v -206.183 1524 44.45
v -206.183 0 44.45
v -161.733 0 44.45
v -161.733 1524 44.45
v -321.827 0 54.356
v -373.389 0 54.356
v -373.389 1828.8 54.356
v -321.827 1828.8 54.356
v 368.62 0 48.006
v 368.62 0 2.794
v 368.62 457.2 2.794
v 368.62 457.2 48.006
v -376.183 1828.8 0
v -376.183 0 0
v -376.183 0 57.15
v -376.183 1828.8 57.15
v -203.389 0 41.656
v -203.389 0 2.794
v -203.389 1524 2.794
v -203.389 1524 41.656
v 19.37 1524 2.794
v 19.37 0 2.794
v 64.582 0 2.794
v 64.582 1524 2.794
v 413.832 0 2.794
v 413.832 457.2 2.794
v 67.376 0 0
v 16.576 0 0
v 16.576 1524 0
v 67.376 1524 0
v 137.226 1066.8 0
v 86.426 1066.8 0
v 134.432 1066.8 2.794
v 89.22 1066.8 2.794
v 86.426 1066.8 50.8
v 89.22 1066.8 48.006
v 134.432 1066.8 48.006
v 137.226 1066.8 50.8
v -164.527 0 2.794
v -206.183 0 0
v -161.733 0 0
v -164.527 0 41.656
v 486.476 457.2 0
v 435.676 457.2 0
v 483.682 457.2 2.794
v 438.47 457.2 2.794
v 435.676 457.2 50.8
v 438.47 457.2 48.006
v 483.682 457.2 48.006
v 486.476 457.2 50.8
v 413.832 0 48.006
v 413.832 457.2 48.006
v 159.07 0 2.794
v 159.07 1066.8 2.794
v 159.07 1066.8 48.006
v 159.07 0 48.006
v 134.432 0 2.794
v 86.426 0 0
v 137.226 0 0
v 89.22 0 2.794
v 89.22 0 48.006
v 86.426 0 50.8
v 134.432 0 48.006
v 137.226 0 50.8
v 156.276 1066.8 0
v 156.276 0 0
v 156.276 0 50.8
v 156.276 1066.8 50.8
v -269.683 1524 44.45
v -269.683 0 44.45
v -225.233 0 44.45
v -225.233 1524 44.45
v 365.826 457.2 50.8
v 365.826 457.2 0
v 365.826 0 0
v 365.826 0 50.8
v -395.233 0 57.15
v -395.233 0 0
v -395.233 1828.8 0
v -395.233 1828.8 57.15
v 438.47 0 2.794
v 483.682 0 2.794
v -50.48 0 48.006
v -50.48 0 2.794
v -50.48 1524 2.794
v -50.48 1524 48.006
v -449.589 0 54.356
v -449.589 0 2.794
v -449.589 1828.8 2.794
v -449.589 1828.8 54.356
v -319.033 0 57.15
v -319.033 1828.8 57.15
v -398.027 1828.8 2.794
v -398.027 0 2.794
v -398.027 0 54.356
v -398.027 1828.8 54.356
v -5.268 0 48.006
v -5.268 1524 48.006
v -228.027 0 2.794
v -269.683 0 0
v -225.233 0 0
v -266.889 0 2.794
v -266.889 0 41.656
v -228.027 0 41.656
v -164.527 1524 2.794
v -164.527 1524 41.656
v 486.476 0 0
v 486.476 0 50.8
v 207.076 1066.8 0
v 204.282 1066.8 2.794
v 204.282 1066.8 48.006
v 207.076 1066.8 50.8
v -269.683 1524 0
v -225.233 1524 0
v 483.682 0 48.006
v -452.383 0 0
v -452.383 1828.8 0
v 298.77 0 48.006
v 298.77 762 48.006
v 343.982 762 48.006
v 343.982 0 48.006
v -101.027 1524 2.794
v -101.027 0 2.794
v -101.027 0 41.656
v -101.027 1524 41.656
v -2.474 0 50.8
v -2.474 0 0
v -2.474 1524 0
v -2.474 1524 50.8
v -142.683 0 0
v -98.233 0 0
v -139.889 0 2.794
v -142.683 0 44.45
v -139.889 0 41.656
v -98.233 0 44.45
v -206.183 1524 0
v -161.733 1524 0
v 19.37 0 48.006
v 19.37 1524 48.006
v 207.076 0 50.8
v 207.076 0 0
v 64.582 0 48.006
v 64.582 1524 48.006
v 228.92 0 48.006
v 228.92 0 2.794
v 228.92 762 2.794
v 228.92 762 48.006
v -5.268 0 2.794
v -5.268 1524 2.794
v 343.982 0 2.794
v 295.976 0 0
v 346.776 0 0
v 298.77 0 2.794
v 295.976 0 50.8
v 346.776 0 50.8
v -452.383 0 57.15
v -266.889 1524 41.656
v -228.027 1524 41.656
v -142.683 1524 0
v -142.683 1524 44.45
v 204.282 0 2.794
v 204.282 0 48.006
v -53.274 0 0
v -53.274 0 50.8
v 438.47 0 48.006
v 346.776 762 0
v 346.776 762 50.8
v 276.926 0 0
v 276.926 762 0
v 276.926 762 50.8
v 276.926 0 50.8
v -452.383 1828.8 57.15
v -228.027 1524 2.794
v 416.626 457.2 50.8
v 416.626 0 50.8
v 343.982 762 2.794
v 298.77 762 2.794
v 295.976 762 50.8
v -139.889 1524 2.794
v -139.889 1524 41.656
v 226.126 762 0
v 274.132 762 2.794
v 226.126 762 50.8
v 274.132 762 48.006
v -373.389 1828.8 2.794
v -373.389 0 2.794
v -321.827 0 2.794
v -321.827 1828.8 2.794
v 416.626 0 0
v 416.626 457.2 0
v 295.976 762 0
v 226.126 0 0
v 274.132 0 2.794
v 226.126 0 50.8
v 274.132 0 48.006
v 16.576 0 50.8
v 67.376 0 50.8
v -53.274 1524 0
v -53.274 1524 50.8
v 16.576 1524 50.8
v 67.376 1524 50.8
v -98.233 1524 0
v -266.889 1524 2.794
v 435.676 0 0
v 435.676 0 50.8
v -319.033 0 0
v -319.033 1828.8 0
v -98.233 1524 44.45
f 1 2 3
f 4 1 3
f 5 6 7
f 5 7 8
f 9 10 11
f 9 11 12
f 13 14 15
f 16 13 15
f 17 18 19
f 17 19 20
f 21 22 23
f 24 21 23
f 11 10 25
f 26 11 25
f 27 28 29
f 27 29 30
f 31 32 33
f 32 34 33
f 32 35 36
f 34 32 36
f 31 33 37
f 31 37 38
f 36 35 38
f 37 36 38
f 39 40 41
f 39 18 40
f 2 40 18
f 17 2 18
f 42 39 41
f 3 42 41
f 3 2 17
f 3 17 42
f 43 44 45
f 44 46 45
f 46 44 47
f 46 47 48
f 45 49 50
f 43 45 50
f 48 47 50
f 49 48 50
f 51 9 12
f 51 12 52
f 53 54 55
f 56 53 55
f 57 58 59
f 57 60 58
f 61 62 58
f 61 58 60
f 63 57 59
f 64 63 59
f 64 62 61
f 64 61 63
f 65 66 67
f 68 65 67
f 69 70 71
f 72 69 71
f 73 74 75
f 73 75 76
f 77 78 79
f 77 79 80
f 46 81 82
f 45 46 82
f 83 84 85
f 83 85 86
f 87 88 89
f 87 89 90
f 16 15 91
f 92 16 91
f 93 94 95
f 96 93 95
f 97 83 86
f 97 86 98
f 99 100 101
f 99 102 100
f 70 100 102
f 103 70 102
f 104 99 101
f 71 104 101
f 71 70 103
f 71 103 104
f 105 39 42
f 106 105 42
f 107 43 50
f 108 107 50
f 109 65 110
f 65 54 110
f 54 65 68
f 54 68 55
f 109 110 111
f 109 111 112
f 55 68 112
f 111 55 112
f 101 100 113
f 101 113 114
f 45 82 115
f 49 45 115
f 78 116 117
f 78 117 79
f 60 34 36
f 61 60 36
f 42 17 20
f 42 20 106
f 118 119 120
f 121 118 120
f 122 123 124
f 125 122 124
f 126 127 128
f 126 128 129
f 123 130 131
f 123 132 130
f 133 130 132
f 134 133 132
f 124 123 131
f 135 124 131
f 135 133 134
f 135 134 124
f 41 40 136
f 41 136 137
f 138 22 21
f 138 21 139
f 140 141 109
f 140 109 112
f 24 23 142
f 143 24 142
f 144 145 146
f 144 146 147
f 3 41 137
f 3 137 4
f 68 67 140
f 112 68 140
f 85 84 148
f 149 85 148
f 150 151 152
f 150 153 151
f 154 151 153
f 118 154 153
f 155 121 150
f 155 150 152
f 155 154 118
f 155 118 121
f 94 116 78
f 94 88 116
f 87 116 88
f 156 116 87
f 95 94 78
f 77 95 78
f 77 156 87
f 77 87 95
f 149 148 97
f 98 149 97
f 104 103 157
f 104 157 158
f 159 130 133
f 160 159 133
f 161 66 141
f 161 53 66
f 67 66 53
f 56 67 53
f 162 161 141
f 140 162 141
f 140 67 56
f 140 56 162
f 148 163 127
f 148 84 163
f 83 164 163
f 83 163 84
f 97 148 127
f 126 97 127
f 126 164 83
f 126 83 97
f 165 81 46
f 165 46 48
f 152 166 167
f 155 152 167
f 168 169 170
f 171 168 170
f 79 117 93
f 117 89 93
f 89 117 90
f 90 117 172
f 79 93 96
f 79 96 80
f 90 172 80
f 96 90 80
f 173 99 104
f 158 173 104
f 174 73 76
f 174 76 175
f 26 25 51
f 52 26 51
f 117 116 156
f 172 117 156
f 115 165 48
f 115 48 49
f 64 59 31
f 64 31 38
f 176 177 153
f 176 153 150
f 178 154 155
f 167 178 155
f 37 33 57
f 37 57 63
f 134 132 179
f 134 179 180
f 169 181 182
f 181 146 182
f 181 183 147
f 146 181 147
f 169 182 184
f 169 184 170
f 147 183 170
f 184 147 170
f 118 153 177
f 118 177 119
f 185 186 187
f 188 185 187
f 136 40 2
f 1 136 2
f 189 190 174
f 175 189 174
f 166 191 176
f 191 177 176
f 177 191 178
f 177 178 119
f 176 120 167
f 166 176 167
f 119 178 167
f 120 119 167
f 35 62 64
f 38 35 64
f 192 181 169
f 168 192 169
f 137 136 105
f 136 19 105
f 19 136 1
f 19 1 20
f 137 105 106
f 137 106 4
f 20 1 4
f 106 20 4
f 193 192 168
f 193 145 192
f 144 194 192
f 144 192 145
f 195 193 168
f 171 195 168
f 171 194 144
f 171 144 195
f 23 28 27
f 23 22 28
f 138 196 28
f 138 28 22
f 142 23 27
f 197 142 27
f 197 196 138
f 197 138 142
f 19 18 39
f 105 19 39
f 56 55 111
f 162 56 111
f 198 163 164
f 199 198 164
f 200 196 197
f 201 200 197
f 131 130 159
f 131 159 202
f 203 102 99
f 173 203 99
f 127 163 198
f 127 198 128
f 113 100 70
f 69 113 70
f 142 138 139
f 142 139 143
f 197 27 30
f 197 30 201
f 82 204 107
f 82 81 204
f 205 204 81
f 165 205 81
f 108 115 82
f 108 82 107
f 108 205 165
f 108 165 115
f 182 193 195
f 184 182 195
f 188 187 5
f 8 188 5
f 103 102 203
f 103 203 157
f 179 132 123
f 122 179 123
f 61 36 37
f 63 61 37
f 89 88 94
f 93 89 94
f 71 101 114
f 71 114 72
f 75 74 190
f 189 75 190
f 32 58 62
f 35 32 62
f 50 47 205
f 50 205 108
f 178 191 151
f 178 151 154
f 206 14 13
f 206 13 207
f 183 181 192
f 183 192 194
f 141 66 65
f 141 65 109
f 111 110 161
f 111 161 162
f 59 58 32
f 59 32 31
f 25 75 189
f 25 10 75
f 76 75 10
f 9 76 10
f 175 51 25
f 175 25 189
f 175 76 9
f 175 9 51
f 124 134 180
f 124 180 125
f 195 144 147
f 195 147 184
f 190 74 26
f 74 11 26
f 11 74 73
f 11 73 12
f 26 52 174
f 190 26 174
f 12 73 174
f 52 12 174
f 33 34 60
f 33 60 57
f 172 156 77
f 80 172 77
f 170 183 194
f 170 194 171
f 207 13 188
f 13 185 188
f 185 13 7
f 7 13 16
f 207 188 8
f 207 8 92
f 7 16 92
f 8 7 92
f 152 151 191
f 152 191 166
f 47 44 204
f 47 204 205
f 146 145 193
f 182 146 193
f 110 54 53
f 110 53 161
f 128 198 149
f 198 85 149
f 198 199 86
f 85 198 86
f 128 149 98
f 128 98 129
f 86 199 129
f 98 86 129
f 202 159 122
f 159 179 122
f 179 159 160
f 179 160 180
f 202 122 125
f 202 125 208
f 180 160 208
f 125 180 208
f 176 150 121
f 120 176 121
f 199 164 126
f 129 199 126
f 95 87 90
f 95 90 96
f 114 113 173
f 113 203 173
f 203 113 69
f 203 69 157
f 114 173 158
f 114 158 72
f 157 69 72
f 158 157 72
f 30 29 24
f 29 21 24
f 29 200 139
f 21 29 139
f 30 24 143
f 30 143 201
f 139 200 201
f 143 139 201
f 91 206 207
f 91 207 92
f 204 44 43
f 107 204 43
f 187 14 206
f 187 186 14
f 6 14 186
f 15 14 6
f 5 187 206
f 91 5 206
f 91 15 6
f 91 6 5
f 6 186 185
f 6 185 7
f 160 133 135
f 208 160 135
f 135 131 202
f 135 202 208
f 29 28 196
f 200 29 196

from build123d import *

# Parameters (mm, degrees)
F0_W     = 44.45
F0_H     = 44.45
F0_W_2   = 38.862
F0_H_2   = 38.862
F1_DEPTH = 1524
F0_W_3   = 50.8
F0_H_3   = 50.8
F0_W_4   = 45.212
F0_H_4   = 45.212
F2_DEPTH = 1524
F3_DEPTH = 1066.8
F4_DEPTH = 762
F5_DEPTH = 457.2
F0_W_5   = 57.15
F0_H_5   = 57.15
F0_W_6   = 51.562
F0_H_6   = 51.562
F6_DEPTH = 1828.8


with BuildPart() as f1:
    # F0 (on Front) → F1 (new body)
    with BuildSketch(Plane.XZ):
        with Locations((-247.45845, 22.225)):
            Rectangle(F0_W, F0_H)
        with Locations((-247.45845, 22.225)):
            Rectangle(F0_W_2, F0_H_2, mode=Mode.SUBTRACT)
        with Locations((-183.95845, 22.225)):
            Rectangle(F0_W, F0_H)
        with Locations((-183.95845, 22.225)):
            Rectangle(F0_W_2, F0_H_2, mode=Mode.SUBTRACT)
        with Locations((-120.45845, 22.225)):
            Rectangle(F0_W, F0_H)
        with Locations((-120.45845, 22.225)):
            Rectangle(F0_W_2, F0_H_2, mode=Mode.SUBTRACT)
    extrude(amount=-F1_DEPTH)


with BuildPart() as f2:
    # F0 (on Front) → F2 (new body)
    with BuildSketch(Plane.XZ):
        with Locations((-27.873619, 25.4)):
            Rectangle(F0_W_3, F0_H_3)
        with Locations((-27.873619, 25.4)):
            Rectangle(F0_W_4, F0_H_4, mode=Mode.SUBTRACT)
        with Locations((41.976381, 25.4)):
            Rectangle(F0_W_3, F0_H_3)
        with Locations((41.976381, 25.4)):
            Rectangle(F0_W_4, F0_H_4, mode=Mode.SUBTRACT)
    extrude(amount=-F2_DEPTH)


with BuildPart() as f3:
    # F0 (on Front) → F3 (new body)
    with BuildSketch(Plane.XZ):
        with Locations((111.826381, 25.4)):
            Rectangle(F0_W_3, F0_H_3)
        with Locations((111.826381, 25.4)):
            Rectangle(F0_W_4, F0_H_4, mode=Mode.SUBTRACT)
        with Locations((181.676381, 25.4)):
            Rectangle(F0_W_3, F0_H_3)
        with Locations((181.676381, 25.4)):
            Rectangle(F0_W_4, F0_H_4, mode=Mode.SUBTRACT)
    extrude(amount=-F3_DEPTH)


with BuildPart() as f4:
    # F0 (on Front) → F4 (new body)
    with BuildSketch(Plane.XZ):
        with Locations((251.526381, 25.4)):
            Rectangle(F0_W_3, F0_H_3)
        with Locations((251.526381, 25.4)):
            Rectangle(F0_W_4, F0_H_4, mode=Mode.SUBTRACT)
        with Locations((321.376381, 25.4)):
            Rectangle(F0_W_3, F0_H_3)
        with Locations((321.376381, 25.4)):
            Rectangle(F0_W_4, F0_H_4, mode=Mode.SUBTRACT)
    extrude(amount=-F4_DEPTH)


with BuildPart() as f5:
    # F0 (on Front) → F5 (new body)
    with BuildSketch(Plane.XZ):
        with Locations((391.226381, 25.4)):
            Rectangle(F0_W_3, F0_H_3)
        with Locations((391.226381, 25.4)):
            Rectangle(F0_W_4, F0_H_4, mode=Mode.SUBTRACT)
        with Locations((461.076381, 25.4)):
            Rectangle(F0_W_3, F0_H_3)
        with Locations((461.076381, 25.4)):
            Rectangle(F0_W_4, F0_H_4, mode=Mode.SUBTRACT)
    extrude(amount=-F5_DEPTH)


with BuildPart() as f6:
    # F0 (on Front) → F6 (new body)
    with BuildSketch(Plane.XZ):
        with Locations((-423.807714, 28.575)):
            Rectangle(F0_W_5, F0_H_5)
        with Locations((-423.807714, 28.575)):
            Rectangle(F0_W_6, F0_H_6, mode=Mode.SUBTRACT)
        with Locations((-347.607714, 28.575)):
            Rectangle(F0_W_5, F0_H_5)
        with Locations((-347.607714, 28.575)):
            Rectangle(F0_W_6, F0_H_6, mode=Mode.SUBTRACT)
    extrude(amount=-F6_DEPTH)


solid = Compound([f1.part, f2.part, f3.part, f4.part, f5.part, f6.part])
